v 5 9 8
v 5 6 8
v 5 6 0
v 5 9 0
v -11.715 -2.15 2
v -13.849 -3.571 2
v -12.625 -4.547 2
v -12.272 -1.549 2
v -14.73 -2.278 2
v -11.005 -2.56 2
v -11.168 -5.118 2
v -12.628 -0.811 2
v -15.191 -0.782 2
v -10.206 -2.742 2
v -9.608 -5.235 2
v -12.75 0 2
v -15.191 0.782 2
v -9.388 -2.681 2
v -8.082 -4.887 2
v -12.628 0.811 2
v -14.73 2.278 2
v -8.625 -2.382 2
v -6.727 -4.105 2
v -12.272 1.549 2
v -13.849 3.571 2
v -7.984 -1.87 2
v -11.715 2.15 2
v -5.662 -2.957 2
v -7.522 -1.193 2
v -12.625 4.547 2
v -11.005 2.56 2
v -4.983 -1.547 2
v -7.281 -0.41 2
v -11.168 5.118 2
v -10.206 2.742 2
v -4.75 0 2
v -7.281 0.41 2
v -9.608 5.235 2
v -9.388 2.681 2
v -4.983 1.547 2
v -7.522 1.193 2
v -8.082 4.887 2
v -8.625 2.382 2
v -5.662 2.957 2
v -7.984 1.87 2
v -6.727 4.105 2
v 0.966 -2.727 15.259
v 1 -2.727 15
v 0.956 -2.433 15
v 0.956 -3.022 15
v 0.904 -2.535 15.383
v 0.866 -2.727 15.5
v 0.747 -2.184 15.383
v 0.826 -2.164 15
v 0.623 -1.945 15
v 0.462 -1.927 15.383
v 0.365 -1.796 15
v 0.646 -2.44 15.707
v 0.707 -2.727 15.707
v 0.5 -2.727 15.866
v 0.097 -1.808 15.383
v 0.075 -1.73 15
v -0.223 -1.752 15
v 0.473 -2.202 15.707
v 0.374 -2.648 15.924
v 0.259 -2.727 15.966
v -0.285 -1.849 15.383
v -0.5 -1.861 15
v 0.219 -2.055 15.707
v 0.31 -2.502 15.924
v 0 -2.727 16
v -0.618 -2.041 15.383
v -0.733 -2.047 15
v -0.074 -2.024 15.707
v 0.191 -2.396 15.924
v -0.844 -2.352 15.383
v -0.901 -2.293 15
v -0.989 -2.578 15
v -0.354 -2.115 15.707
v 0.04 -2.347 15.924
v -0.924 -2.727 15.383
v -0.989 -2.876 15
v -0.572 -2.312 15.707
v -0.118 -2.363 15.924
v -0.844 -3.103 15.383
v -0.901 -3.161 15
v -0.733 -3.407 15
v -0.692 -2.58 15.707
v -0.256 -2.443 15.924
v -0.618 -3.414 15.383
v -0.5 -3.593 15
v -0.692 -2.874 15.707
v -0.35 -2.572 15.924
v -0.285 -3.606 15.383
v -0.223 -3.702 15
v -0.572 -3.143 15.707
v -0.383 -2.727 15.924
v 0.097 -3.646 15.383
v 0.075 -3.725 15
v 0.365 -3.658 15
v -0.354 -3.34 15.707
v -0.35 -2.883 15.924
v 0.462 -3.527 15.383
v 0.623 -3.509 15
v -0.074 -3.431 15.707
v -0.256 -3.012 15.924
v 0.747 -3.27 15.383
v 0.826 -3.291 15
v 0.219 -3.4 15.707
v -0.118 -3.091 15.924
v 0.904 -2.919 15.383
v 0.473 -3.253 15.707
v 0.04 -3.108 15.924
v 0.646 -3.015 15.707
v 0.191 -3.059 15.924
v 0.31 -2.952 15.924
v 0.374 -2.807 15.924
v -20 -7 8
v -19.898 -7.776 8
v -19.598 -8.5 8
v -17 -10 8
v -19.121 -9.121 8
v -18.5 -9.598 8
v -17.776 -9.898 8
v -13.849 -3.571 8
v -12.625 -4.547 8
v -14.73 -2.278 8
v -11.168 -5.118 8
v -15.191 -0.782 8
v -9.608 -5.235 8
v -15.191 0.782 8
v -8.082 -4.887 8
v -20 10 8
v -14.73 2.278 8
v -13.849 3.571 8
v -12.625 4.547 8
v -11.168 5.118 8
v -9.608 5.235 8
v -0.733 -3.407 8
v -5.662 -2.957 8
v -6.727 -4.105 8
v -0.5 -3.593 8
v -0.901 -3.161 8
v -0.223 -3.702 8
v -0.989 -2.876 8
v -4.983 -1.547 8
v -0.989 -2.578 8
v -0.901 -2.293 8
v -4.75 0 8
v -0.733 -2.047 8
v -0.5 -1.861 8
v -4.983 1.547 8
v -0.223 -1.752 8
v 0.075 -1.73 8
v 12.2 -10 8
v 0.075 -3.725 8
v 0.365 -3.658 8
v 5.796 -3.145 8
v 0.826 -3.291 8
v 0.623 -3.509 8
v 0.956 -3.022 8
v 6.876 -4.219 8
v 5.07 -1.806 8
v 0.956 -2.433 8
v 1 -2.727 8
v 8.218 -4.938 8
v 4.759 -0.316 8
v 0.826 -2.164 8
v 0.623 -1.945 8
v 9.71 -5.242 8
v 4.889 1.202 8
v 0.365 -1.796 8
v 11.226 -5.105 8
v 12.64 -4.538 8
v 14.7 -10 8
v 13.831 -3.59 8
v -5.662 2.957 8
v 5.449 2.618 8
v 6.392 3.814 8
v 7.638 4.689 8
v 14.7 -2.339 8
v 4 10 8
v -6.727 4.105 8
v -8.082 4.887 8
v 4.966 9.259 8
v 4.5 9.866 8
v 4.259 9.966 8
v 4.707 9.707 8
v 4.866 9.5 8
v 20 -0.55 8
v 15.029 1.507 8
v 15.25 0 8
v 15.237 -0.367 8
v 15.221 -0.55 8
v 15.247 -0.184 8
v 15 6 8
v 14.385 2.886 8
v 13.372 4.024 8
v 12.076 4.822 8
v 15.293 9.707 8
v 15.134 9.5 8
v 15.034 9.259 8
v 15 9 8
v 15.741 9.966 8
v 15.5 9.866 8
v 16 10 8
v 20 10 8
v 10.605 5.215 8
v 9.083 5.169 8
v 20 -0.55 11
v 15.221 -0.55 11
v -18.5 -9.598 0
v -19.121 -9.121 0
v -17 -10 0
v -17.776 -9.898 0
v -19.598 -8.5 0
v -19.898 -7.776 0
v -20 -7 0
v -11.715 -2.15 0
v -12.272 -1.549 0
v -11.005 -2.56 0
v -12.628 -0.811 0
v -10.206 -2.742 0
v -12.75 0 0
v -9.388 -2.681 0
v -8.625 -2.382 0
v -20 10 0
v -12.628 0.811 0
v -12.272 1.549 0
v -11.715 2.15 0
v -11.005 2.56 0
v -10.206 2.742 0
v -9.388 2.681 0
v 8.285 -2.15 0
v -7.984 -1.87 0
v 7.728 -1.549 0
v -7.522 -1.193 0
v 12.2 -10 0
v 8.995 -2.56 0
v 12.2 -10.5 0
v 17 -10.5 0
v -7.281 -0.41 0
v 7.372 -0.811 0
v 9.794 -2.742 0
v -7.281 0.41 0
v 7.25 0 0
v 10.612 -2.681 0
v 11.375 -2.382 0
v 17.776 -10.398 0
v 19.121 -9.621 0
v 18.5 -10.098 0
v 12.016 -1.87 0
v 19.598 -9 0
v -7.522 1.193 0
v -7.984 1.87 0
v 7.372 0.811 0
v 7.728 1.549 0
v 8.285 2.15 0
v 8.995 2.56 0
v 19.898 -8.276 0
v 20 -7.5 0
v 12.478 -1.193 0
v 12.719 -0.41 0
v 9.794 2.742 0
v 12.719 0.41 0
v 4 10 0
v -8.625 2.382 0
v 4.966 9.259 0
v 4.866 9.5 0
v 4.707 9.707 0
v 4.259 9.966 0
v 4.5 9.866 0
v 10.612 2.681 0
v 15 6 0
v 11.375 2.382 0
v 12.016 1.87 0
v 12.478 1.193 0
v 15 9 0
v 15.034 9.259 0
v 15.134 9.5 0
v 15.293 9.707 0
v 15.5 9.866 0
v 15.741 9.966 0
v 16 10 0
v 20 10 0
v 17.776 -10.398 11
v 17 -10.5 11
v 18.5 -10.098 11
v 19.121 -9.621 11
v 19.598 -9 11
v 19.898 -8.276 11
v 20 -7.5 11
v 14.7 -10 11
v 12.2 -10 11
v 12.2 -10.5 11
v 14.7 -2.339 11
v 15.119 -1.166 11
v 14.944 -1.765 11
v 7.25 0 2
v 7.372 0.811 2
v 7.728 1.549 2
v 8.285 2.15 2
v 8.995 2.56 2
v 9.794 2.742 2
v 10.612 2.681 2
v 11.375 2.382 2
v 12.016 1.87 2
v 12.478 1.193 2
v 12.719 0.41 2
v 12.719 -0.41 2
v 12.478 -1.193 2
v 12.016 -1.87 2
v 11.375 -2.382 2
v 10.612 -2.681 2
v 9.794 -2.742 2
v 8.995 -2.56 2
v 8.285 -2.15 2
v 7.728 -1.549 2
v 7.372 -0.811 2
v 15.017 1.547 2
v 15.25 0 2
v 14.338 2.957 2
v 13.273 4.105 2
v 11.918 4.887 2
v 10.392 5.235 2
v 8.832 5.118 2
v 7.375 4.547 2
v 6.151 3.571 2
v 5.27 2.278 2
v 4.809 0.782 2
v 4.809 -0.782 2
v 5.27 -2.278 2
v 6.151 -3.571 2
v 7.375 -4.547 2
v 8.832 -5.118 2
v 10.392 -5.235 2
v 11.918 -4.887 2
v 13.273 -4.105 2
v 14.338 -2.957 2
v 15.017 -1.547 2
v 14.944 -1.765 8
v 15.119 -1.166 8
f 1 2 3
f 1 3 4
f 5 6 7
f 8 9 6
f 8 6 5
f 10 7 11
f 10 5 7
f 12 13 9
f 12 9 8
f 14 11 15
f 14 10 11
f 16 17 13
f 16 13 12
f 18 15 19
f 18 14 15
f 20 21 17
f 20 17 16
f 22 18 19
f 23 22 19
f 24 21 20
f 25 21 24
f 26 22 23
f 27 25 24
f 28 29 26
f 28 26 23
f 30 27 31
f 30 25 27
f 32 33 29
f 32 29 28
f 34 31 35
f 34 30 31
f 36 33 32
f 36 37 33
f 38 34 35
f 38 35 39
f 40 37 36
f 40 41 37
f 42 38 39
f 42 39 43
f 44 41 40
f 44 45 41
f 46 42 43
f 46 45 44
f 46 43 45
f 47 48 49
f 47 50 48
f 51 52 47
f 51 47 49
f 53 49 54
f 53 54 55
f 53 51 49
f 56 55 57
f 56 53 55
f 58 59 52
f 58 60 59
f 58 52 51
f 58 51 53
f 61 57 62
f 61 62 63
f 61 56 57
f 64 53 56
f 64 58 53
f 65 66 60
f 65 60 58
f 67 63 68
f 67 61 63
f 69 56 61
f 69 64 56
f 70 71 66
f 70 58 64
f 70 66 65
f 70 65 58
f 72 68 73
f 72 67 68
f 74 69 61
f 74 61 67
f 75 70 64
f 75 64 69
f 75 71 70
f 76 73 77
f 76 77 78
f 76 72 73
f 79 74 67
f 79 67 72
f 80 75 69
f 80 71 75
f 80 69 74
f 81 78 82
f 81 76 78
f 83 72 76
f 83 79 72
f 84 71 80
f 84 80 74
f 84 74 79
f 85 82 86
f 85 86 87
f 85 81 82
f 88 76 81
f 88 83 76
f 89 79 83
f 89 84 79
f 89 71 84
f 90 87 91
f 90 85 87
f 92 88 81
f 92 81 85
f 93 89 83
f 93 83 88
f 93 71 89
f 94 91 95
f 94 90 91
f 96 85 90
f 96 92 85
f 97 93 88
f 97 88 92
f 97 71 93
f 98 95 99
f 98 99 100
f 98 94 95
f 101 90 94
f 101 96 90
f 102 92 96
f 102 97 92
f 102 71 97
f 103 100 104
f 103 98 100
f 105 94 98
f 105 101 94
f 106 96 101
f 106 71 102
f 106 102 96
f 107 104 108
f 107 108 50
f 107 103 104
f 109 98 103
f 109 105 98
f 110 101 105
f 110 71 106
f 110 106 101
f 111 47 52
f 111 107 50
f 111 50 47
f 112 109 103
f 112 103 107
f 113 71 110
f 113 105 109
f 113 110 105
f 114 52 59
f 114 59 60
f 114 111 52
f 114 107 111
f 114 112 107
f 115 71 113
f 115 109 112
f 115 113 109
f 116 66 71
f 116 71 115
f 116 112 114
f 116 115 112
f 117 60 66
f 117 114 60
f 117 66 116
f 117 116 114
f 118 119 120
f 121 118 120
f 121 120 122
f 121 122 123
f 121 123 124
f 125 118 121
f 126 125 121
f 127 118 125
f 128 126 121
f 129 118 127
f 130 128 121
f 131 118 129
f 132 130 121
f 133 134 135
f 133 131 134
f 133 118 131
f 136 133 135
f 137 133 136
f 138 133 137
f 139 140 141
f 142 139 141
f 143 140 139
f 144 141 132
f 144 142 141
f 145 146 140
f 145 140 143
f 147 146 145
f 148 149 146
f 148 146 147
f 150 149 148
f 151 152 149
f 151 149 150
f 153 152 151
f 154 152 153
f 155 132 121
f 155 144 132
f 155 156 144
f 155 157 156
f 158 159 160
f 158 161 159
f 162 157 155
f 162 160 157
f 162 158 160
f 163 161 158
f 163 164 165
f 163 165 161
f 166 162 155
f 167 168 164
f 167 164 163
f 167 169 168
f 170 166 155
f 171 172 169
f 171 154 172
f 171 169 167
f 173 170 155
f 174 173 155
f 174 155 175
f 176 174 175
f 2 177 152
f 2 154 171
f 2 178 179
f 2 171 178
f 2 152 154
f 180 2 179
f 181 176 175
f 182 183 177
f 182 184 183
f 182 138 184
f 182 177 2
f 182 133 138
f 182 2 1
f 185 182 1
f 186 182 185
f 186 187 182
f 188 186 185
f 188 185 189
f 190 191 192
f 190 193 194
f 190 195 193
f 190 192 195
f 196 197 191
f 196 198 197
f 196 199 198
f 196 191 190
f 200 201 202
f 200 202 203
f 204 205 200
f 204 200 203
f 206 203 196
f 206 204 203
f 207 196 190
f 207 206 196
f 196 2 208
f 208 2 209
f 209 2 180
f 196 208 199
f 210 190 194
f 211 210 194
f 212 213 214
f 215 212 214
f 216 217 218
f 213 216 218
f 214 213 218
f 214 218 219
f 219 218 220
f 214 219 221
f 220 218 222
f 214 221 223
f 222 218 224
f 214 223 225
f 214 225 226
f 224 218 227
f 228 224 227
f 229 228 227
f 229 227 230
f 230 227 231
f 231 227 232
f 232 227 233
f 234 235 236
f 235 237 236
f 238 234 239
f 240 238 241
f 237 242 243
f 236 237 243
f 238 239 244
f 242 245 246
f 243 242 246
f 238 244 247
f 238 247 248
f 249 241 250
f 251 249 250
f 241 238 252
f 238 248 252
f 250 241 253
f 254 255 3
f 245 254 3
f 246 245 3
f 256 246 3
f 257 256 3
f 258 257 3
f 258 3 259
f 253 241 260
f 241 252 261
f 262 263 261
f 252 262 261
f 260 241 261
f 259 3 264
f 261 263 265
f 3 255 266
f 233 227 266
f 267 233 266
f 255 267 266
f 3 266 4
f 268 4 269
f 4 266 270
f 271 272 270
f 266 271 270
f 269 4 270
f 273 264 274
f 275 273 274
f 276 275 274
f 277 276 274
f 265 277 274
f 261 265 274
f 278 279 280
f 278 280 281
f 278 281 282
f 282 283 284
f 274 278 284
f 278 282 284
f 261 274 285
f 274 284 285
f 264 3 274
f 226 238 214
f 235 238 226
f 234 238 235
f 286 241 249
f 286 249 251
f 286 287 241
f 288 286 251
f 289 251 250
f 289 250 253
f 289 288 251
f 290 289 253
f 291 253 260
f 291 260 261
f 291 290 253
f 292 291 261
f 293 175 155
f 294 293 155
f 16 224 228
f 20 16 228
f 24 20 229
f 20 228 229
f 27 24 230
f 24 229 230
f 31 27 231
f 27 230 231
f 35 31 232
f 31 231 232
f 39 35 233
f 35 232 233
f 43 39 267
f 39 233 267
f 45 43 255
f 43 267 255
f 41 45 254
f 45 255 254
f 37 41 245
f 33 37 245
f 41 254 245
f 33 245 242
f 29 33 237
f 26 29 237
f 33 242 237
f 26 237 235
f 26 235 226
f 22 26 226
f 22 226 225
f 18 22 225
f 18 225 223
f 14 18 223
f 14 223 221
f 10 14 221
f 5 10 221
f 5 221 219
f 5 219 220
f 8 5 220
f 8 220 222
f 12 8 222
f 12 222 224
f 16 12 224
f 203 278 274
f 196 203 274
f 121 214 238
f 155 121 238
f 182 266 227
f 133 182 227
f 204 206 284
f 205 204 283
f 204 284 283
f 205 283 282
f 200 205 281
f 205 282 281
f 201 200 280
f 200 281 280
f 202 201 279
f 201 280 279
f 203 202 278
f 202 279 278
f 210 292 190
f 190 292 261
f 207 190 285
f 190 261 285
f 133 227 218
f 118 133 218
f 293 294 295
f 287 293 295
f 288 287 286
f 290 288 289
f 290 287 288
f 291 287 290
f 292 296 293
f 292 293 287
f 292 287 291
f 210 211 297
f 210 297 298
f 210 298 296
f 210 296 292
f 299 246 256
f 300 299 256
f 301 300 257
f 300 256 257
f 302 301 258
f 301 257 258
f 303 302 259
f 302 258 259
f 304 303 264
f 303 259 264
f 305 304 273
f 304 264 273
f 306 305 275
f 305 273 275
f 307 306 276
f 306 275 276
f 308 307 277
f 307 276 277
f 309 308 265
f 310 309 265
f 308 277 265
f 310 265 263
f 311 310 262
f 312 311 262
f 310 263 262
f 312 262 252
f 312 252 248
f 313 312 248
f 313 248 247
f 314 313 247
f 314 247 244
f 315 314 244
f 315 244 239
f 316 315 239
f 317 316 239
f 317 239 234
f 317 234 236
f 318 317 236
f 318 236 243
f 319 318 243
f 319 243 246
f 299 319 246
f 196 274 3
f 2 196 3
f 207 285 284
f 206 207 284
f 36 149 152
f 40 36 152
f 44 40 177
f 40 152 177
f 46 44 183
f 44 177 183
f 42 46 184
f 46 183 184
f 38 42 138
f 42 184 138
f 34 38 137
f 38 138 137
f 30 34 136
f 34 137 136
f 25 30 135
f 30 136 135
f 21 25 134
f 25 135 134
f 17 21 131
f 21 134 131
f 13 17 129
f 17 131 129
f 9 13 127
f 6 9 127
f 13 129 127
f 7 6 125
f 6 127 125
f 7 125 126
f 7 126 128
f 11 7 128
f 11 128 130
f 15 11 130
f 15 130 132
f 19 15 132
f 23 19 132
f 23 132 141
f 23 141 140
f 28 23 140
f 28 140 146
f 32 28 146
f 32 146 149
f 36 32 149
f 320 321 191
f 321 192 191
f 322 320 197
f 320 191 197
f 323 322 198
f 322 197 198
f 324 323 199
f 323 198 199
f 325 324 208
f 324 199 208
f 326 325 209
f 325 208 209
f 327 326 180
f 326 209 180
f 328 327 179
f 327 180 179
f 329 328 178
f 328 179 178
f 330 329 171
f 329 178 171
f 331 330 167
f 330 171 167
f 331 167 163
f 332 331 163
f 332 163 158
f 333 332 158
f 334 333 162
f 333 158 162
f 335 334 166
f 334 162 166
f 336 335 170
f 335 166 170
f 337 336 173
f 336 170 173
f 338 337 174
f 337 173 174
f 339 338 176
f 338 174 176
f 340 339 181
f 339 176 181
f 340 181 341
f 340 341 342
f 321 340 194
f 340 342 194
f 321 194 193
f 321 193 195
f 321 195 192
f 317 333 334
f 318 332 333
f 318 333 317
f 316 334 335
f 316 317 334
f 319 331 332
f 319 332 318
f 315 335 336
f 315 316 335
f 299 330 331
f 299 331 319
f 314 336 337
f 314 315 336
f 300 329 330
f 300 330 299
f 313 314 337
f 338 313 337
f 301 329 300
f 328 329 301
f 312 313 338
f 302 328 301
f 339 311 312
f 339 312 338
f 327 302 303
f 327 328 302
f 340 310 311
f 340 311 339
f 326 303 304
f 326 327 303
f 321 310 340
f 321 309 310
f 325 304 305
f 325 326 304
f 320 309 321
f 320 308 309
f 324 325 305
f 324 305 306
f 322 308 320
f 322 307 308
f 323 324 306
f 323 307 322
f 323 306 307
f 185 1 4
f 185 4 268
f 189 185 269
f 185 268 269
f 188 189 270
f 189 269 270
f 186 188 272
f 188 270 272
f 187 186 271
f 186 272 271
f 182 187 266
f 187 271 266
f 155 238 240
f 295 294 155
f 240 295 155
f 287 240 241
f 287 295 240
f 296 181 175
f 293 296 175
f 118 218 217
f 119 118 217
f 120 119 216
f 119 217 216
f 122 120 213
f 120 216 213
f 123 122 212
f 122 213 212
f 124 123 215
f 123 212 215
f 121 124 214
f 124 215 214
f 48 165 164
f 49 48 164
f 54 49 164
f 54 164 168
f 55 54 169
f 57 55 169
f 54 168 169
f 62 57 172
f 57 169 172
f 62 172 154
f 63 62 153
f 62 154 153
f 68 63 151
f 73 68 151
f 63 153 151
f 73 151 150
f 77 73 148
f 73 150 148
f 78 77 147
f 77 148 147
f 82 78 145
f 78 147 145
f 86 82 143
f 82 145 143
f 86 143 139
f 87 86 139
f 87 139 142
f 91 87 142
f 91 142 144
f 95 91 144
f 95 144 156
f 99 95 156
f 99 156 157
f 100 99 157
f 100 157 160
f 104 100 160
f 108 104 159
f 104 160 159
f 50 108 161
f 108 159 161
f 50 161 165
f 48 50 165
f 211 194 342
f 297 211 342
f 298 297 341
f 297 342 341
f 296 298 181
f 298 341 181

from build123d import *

# Parameters (mm, degrees)
BOSS_EXTRUDE1_DEPTH            = 8
CBORE_FOR_M5_SHCS1_D           = 5.5
CBORE_FOR_M5_SHCS1_DEPTH       = 8
CBORE_FOR_M5_SHCS1_CBORE_D     = 10.5
CBORE_FOR_M5_SHCS1_CBORE_DEPTH = 6
SKETCH6_R                      = 1
BOSS_EXTRUDE3_DEPTH            = 8
FILLET2_R                      = 1
BOSS_EXTRUDE4_DEPTH            = 3
BOSS_EXTRUDE4_DEPTH_BACK       = 8


with BuildPart() as part:
    # Sketch1 → Boss-Extrude1 (new body)
    with BuildSketch(Plane.XY):
        with BuildLine():
            Line((-17, -10), (17, -10))
            ThreePointArc((17, -10), (19.121320344, -9.121320344), (20, -7))
            Line((20, -7), (20, 10))
            Line((20, 10), (16, 10))
            ThreePointArc((16, 10), (15.292893219, 9.707106781), (15, 9))
            Line((15, 9), (15, 6))
            Line((15, 6), (5, 6))
            Line((5, 6), (5, 9))
            ThreePointArc((5, 9), (4.707106781, 9.707106781), (4, 10))
            Line((4, 10), (-20, 10))
            Line((-20, 10), (-20, -7))
            ThreePointArc((-20, -7), (-19.121320344, -9.121320344), (-17, -10))
        make_face()
    extrude(amount=BOSS_EXTRUDE1_DEPTH)

    # CBORE for M5 SHCS1
    with Locations(Plane.XY.offset(8)):
        with Locations((-10, 0), (10, 0)):
            CounterBoreHole(CBORE_FOR_M5_SHCS1_D / 2, CBORE_FOR_M5_SHCS1_CBORE_D / 2, CBORE_FOR_M5_SHCS1_CBORE_DEPTH, depth=CBORE_FOR_M5_SHCS1_DEPTH)

    # Sketch6 → Boss-Extrude3 (add)
    with BuildSketch(Plane.XY.offset(8)):
        with Locations((0, -2.727298247)):
            Circle(SKETCH6_R)
    extrude(amount=BOSS_EXTRUDE3_DEPTH)

    # Fillet2
    fillet2_edges = [part.edges().sort_by_distance(p)[0] for p in [
        (-1, -2.727298247, 16),
    ]]
    fillet(fillet2_edges, radius=FILLET2_R)

    # Sketch7 → Boss-Extrude4 (add, two sides)
    with BuildSketch(Plane.XY.offset(8)) as boss_extrude4_sk:
        with BuildLine():
            Line((20, -0.55), (15.221110993, -0.55))
            ThreePointArc((15.221110993, -0.55), (15.040589551, -1.467977174), (14.7, -2.339337513))
            Line((14.7, -2.339337513), (14.7, -10))
            Line((14.7, -10), (12.2, -10))
            Line((12.2, -10), (12.2, -10.5))
            Line((12.2, -10.5), (17, -10.5))
            ThreePointArc((17, -10.5), (19.121320344, -9.621320344), (20, -7.5))
            Line((20, -7.5), (20, -0.55))
        make_face()
    extrude(amount=BOSS_EXTRUDE4_DEPTH)
    extrude(boss_extrude4_sk.sketch, amount=-BOSS_EXTRUDE4_DEPTH_BACK)


solid = part.part
